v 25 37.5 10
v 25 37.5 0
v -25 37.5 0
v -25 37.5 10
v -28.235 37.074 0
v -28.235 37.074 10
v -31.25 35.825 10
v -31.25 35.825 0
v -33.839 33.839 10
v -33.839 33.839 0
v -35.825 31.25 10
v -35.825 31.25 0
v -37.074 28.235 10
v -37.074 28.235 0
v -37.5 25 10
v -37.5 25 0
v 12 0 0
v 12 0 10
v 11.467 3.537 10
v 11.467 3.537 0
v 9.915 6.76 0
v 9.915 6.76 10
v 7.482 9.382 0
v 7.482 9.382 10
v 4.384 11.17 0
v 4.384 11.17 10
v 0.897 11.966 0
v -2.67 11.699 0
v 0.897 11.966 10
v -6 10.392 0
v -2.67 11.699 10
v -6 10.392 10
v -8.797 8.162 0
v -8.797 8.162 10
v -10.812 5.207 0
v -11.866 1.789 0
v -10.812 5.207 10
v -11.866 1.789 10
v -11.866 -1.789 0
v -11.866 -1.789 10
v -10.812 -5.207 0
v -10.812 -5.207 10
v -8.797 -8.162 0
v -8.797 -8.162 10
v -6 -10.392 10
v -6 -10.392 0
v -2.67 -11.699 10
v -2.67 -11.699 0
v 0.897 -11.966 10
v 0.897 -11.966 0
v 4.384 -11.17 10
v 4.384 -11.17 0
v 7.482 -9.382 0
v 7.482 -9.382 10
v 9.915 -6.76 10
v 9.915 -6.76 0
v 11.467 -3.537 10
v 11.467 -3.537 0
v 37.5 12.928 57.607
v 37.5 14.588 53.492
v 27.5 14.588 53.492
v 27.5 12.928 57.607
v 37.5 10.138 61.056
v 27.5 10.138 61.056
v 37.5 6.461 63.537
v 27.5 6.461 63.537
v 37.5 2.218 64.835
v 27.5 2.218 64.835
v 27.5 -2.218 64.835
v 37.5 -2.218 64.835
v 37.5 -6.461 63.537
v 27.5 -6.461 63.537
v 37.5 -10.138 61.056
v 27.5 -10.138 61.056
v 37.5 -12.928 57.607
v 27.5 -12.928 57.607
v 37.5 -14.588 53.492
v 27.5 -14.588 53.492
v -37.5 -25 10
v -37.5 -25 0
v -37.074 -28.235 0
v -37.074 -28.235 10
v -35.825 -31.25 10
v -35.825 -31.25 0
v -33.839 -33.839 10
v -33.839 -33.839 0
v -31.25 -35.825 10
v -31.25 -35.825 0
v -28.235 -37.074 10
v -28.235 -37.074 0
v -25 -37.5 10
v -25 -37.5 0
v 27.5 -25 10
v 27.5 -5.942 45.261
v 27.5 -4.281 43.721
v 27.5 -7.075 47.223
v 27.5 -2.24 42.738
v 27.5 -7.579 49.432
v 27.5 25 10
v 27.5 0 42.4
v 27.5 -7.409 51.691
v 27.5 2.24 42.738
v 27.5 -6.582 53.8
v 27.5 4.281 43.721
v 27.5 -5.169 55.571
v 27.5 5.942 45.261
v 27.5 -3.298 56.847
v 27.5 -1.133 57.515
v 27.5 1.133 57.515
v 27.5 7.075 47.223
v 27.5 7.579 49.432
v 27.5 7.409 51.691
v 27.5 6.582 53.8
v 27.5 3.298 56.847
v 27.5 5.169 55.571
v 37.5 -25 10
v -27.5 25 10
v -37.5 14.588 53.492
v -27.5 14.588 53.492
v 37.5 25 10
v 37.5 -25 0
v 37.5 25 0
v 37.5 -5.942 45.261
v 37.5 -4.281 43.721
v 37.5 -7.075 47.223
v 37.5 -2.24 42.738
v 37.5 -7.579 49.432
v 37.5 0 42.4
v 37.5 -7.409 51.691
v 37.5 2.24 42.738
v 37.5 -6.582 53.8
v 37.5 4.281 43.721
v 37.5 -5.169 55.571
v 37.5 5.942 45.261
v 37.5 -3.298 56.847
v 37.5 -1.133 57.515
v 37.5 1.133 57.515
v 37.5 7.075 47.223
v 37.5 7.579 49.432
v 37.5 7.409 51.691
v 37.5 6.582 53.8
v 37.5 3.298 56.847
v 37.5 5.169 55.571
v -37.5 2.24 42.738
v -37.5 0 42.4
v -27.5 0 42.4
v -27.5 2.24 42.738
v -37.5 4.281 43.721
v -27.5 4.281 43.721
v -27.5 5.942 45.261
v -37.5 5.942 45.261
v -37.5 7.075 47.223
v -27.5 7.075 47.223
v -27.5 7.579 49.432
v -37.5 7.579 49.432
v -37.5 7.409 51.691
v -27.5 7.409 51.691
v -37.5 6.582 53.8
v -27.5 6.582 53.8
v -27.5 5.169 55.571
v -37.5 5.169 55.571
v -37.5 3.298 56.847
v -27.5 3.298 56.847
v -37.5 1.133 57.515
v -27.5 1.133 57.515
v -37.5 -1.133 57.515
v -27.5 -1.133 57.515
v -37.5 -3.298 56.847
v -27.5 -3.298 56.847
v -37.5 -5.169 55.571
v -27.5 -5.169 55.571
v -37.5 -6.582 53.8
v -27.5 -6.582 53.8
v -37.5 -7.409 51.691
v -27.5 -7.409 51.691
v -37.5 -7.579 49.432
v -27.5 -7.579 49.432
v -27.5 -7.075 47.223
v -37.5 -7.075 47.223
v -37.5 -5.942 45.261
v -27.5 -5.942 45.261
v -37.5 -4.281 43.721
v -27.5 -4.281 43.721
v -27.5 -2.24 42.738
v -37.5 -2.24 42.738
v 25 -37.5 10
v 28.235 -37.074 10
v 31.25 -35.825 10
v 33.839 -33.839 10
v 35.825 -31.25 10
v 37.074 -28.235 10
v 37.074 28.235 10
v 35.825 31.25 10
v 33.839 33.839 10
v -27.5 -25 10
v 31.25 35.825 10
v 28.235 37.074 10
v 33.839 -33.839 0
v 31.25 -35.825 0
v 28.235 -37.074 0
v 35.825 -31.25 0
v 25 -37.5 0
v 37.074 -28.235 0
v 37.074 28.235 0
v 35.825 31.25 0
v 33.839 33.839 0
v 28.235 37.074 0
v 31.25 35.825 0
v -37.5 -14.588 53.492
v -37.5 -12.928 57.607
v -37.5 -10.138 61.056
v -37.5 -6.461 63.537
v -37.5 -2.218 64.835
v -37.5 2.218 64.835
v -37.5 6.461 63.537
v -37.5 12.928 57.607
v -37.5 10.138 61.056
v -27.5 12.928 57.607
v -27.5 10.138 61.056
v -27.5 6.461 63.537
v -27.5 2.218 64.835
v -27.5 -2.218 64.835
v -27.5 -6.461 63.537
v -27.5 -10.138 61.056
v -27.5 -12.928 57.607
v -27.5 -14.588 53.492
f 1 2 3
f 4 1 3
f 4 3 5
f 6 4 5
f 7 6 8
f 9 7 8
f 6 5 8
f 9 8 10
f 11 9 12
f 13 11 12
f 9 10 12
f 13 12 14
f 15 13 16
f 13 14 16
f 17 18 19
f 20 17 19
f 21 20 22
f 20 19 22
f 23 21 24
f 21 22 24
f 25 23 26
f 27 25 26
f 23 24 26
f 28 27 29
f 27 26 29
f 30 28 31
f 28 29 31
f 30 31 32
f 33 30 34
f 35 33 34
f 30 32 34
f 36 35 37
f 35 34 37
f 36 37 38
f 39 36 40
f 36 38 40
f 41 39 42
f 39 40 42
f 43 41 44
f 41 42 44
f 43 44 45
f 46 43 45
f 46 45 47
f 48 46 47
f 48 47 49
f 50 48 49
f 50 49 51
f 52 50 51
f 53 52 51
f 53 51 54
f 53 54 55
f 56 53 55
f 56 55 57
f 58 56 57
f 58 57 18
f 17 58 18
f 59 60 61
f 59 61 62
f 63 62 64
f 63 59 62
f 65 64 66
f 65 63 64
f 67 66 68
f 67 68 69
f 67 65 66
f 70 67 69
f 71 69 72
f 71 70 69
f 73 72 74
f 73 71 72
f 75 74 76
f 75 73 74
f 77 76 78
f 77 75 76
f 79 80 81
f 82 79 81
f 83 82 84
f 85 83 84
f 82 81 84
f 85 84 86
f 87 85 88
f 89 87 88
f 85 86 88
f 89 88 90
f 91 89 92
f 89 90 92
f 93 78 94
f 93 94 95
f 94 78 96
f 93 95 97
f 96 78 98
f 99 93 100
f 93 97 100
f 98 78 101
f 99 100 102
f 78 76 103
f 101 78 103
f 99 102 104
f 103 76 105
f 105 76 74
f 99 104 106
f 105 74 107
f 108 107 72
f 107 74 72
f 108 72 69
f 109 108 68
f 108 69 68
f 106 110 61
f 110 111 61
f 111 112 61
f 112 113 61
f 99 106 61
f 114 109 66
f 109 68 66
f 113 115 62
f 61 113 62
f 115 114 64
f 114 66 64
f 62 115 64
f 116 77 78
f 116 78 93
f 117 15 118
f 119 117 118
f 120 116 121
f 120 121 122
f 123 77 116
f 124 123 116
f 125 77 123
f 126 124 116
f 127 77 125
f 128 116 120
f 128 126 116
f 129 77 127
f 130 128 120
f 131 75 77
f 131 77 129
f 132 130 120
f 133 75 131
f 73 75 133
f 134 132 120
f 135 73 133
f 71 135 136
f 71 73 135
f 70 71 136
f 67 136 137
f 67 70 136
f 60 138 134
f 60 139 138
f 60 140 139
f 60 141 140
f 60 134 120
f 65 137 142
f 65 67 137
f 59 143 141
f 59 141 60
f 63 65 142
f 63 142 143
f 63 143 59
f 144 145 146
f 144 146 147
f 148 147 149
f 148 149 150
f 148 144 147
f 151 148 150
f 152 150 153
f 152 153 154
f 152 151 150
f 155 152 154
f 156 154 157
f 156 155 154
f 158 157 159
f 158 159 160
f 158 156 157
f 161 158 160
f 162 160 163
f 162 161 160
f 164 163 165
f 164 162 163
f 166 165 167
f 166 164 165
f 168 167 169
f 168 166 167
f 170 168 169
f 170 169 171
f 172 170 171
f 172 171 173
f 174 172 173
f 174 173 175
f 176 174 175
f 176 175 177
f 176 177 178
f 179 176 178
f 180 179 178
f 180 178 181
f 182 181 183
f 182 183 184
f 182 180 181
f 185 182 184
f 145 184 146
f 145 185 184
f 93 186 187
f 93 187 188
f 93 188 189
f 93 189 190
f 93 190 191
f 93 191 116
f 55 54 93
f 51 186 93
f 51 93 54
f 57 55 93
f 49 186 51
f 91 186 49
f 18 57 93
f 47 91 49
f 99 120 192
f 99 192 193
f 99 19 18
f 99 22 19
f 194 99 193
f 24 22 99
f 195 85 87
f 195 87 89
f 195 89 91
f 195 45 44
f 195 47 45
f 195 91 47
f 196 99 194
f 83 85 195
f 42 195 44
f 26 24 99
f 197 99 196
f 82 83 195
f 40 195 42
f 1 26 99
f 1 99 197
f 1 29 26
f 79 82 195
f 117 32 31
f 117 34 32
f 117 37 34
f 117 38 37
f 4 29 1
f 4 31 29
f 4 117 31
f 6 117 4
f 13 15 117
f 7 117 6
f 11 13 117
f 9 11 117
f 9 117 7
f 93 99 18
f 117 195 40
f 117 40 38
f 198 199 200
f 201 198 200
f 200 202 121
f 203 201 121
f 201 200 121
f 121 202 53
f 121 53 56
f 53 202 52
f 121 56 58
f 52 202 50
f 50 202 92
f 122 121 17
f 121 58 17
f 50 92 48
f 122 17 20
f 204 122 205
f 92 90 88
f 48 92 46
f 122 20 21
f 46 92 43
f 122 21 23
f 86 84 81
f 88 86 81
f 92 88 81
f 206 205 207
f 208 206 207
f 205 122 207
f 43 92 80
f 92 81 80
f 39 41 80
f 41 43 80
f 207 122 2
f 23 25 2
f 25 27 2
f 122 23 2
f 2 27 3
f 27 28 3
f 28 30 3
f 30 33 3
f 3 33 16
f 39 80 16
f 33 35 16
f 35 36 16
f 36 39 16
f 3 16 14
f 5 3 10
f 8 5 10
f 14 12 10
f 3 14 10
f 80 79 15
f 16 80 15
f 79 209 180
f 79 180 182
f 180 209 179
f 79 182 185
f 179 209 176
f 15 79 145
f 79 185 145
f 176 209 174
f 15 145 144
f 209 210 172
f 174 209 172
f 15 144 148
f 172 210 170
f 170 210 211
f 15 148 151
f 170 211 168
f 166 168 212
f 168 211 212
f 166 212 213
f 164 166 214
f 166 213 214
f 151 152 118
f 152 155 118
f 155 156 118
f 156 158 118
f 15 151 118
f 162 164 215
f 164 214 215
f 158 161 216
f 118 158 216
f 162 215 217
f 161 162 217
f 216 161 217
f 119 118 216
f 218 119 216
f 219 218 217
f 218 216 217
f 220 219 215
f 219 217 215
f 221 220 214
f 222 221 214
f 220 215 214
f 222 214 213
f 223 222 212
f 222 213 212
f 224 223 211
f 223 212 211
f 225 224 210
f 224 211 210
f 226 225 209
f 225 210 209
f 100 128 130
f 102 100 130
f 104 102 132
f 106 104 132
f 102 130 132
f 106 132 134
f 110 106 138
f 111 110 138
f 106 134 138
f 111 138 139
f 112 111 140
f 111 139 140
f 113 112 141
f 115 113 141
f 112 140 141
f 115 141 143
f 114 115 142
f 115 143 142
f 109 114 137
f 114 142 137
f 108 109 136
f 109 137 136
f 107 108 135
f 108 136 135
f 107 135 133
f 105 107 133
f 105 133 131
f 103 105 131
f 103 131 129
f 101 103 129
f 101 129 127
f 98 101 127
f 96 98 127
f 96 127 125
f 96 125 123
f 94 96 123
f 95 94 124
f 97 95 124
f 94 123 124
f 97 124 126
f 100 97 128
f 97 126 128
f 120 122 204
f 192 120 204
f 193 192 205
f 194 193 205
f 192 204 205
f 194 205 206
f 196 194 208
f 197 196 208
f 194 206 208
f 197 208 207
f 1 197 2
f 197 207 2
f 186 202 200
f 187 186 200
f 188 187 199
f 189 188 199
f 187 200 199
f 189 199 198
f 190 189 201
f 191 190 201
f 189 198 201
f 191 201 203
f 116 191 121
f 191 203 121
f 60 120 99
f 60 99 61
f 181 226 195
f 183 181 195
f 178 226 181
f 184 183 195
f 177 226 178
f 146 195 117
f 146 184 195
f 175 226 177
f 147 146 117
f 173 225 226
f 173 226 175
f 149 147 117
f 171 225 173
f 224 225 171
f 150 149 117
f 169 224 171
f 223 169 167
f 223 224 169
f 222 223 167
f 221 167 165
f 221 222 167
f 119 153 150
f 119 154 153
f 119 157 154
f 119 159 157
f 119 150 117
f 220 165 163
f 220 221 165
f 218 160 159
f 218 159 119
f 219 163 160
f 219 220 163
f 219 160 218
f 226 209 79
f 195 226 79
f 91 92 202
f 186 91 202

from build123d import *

# Parameters (mm, degrees)
BOSS_EXTRUDE1_DEPTH = 10
SKETCH2_R           = 7.6
BOSS_EXTRUDE2_DEPTH = 10
SKETCH4_R           = 12
CUT_EXTRUDE2_DEPTH  = 77.40353395


with BuildPart() as part:
    # Sketch1 → Boss-Extrude1 (new body)
    with BuildSketch(Plane(origin=(0, 0, 0), x_dir=(0, 1, 0), z_dir=(0, 0, 1))):
        with BuildLine():
            Line((-25, -37.5), (25, -37.5))
            ThreePointArc((25, -37.5), (33.838834765, -33.838834765), (37.5, -25))
            Line((37.5, -25), (37.5, 25))
            ThreePointArc((37.5, 25), (33.838834765, 33.838834765), (25, 37.5))
            Line((25, 37.5), (-25, 37.5))
            ThreePointArc((-25, 37.5), (-33.838834765, 33.838834765), (-37.5, 25))
            Line((-37.5, 25), (-37.5, -25))
            ThreePointArc((-37.5, -25), (-33.838834765, -33.838834765), (-25, -37.5))
        make_face()
    extrude(amount=BOSS_EXTRUDE1_DEPTH)

    # Sketch2 → Boss-Extrude2 (add)
    with BuildSketch(Plane.YZ.offset(37.5)):
        with BuildLine():
            ThreePointArc((14.587782351, 53.492363969), (0, 65), (-14.587782351, 53.492363969))
            Line((-14.587782351, 53.492363969), (-25, 10))
            Line((-25, 10), (25, 10))
            Line((25, 10), (14.587782351, 53.492363969))
        make_face()
        with Locations(Location((0, 50, 0), (0, 0, 270))):
            Circle(SKETCH2_R, mode=Mode.SUBTRACT)
    boss_extrude2 = extrude(amount=-BOSS_EXTRUDE2_DEPTH)

    # Mirror1: Boss-Extrude2 across plane
    add(boss_extrude2.mirror(Plane(origin=(0, 0, 0), x_dir=(0, 0, 1), z_dir=(1, 0, 0))))

    # Sketch4 → Cut-Extrude2 (cut, through all)
    with BuildSketch(Plane.XY.offset(10)):
        Circle(SKETCH4_R)
    extrude(amount=-CUT_EXTRUDE2_DEPTH, mode=Mode.SUBTRACT)


solid = part.part
